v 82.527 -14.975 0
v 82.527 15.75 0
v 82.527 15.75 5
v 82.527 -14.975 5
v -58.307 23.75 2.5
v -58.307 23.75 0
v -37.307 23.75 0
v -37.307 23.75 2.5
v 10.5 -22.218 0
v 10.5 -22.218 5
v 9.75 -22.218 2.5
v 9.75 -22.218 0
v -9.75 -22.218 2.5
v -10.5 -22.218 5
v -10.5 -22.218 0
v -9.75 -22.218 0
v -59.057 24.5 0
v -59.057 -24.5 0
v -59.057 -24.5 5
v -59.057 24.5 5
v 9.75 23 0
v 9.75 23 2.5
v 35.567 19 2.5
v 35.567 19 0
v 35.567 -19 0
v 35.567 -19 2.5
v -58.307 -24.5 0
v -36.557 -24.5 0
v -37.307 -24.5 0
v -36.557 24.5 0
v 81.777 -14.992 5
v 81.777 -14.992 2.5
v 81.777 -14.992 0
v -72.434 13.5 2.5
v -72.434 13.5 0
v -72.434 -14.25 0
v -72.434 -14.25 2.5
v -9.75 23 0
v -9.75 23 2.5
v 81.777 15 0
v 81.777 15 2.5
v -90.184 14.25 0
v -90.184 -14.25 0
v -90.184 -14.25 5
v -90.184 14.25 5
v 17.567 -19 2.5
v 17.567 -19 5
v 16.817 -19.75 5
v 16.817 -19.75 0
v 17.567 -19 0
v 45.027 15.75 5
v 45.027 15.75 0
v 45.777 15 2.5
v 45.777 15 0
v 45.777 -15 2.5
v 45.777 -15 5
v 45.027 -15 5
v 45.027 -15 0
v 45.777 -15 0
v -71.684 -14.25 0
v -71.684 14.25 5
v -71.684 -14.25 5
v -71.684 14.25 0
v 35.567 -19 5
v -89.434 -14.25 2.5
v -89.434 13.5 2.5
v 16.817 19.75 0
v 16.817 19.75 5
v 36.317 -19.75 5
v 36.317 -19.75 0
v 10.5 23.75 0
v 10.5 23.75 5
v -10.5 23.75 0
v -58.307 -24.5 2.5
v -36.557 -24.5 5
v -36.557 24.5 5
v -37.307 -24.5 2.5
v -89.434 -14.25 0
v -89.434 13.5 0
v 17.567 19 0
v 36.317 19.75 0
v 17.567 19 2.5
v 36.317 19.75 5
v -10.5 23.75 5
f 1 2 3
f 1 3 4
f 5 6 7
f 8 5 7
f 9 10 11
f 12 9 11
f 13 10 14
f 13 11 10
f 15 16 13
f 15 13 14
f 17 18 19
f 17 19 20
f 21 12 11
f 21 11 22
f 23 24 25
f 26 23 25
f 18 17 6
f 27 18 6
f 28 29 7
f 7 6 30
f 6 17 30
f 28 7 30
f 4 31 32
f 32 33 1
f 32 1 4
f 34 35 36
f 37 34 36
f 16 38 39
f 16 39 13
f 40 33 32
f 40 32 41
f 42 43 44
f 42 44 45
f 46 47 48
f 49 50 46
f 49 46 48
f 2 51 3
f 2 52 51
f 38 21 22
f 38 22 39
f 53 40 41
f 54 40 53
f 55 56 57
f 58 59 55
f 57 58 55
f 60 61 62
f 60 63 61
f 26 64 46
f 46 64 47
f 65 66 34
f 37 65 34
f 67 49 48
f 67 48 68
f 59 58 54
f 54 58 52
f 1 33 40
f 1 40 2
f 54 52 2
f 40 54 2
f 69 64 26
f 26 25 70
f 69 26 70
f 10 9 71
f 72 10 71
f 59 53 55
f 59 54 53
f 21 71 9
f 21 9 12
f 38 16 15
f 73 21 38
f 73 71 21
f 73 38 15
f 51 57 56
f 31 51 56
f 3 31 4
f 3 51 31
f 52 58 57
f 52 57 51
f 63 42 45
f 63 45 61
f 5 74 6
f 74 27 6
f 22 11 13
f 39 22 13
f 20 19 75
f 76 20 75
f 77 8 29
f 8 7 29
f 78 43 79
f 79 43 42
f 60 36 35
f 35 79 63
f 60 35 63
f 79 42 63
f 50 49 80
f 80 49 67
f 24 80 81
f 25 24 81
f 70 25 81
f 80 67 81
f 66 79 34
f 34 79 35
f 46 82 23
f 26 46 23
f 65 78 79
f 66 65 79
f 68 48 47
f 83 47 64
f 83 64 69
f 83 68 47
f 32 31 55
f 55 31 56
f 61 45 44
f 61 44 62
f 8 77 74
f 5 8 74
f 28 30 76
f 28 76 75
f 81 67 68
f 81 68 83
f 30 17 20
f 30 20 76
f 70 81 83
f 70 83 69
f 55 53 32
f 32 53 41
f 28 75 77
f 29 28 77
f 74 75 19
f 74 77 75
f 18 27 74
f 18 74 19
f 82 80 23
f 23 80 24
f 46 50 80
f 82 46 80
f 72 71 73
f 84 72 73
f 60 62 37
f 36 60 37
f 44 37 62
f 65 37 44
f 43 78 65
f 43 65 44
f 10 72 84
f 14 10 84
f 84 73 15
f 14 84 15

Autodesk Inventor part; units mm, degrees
ref_plane "YZ Plane" through (0, 0, 0) normal (1, 0, 0) x (0, 1, 0)
ref_plane "XZ Plane" through (0, 0, 0) normal (0, 1, 0) x (-1, 0, 0)
ref_plane "XY Plane" through (0, 0, 0) normal (0, 0, 1) x (1, 0, 0)
sketch "Sketch1" plane through (0, 0, 0) normal (0, 0, 1) x (1, 0, 0)
  point P0 (0, 0)
sketch "Sketch2" plane through (0, 0, 0) normal (0, 0, 1) x (1, 0, 0)
  line L0 (-9.25, -22.217934) -> (-9.25, 23)
  line L1 (-9.25, 23) -> (9.25, 23)
  line L2 (9.25, -23) -> (-9.25, 23) construction
  line L3 (-9.25, -23) -> (9.25, 23) construction
  line L4 (-10, 23.75) -> (10, 23.75)
  line L5 (10, 23.75) -> (10, -22.217934)
  line L6 (-10, -22.217934) -> (-10, 23.75)
  line L7 (-10, 23.75) -> (10, -23.75) construction
  line L8 (10, 23.75) -> (-10, -23.75) construction
  line L9 (-58.307494, 23.75) -> (-37.307494, 23.75)
  line L10 (-37.307494, 23.75) -> (-37.307494, -23.75)
  line L11 (-37.307494, -23.75) -> (-58.307494, -23.75)
  line L12 (-58.307494, -23.75) -> (-58.307494, 23.75)
  line L13 (-58.307494, 23.75) -> (-37.307494, -23.75) construction
  line L14 (-37.307494, 23.75) -> (-58.307494, -23.75) construction
  line L15 (-59.057494, 24.5) -> (-36.557494, 24.5)
  line L16 (-36.557494, 24.5) -> (-36.557494, -24.5)
  line L17 (-36.557494, -24.5) -> (-59.057494, -24.5)
  line L18 (-59.057494, -24.5) -> (-59.057494, 24.5)
  line L19 (-59.057494, 24.5) -> (-36.557494, -24.5) construction
  line L20 (-36.557494, 24.5) -> (-59.057494, -24.5) construction
  line L21 (-89.43439, 13.5) -> (-72.43439, 13.5)
  line L22 (-72.43439, 13.5) -> (-72.43439, -13.5)
  line L23 (-72.43439, -13.5) -> (-89.43439, -13.5)
  line L24 (-89.43439, -13.5) -> (-89.43439, 13.5)
  line L25 (-89.43439, 13.5) -> (-72.43439, -13.5) construction
  line L26 (-72.43439, 13.5) -> (-89.43439, -13.5) construction
  line L27 (-90.18439, -14.25) -> (-90.18439, 14.25)
  line L28 (-90.18439, 14.25) -> (-71.68439, 14.25)
  line L29 (-71.68439, 14.25) -> (-71.68439, -14.25)
  line L30 (-71.68439, -14.25) -> (-90.18439, 14.25) construction
  line L31 (-90.18439, -14.25) -> (-71.68439, 14.25) construction
  line L32 (17.56678, 19) -> (35.56678, 19)
  line L33 (35.56678, 19) -> (35.56678, -19)
  line L34 (35.56678, -19) -> (17.56678, -19)
  line L35 (17.56678, -19) -> (17.56678, 19)
  line L36 (17.56678, 19) -> (35.56678, -19) construction
  line L37 (35.56678, 19) -> (17.56678, -19) construction
  line L38 (16.81678, -19.75) -> (16.81678, 19.75)
  line L39 (16.81678, 19.75) -> (36.31678, 19.75)
  line L40 (36.31678, 19.75) -> (36.31678, -19.75)
  line L41 (36.31678, -19.75) -> (16.81678, 19.75) construction
  line L42 (16.81678, -19.75) -> (36.31678, 19.75) construction
  line L43 (81.776505, -14.991674) -> (81.776505, 15)
  line L44 (81.776505, 15) -> (45.776505, 15)
  line L45 (45.776505, 15) -> (45.776505, -15)
  line L46 (45.776505, -15) -> (81.776505, 15) construction
  line L47 (81.776505, -14.991674) -> (45.776505, 15) construction
  line L48 (45.026505, 15.75) -> (82.526505, 15.75)
  line L49 (82.526505, 15.75) -> (82.526505, -14.974995)
  line L50 (45.026505, -15) -> (45.026505, 15.75)
  line L51 (45.026505, 15.75) -> (82.09375, -15.378222) construction
  line L52 (82.526505, 15.75) -> (63.776505, 0) construction
  line L53 (46.395553, -15) -> (45.526505, -15.75) construction
  line L54 (81.776505, -14.991674) -> (82.526505, -14.974995)
  line L55 (45.776505, -15) -> (45.026505, -15)
  line L56 (-9.25, -23.75) -> (-9.55163, -23.75)
  line L57 (-10, -22.217934) -> (-9.25, -22.217934)
  line L58 (9.25, -22.217934) -> (10, -22.217934)
  line L59 (9.25, 23) -> (9.25, 21.96875)
  line L60 (9.25, -21.96875) -> (9.25, -22.217934)
  line L61 (9.25, -21.96875) -> (9.25, 23)
  line L62 (-89.43439, -13.5) -> (-89.43439, -14.25)
  line L63 (-72.43439, -13.5) -> (-72.43439, -14.25)
  line L64 (-71.68439, -14.25) -> (-72.43439, -14.25)
  line L65 (-89.43439, -14.25) -> (-90.18439, -14.25)
  line L66 (0, 0) -> (0, -5.712725)
  line L67 (17.56678, -19) -> (16.81678, -19.75)
  line L68 (35.56678, -19) -> (36.31678, -19.75)
  line L69 (36.31678, -19.75) -> (35.56678, -19.75)
  line L70 (17.56678, -19.75) -> (16.81678, -19.75)
  line L71 (63.776505, 0) -> (63.776505, -4.283489)
  point P0 (-47.807494, 0)
  point P1 (-47.807494, 0)
  point P2 (-80.93439, 0)
  point P3 (-80.93439, 0)
  point P4 (26.56678, 0)
  point P5 (63.779004, 0.002082)
  dimension "d0" = 18.5
  dimension "d3" = 47.5
  dimension "d4" = 21
  dimension "d5" = 47.5
  dimension "d6" = 22.5
  dimension "d7" = 49
  dimension "d8" = 17
  dimension "d9" = 27
  dimension "d10" = 18.5
  dimension "d11" = 28.5
  dimension "d12" = 18
  dimension "d13" = 38
  dimension "d14" = 19.5
  dimension "d15" = 39.5
  dimension "d16" = 36
  dimension "d24" = 20
  dimension "d25" = 37.5
extrude "Extrusion1" add sketch "Sketch2" along normal blind 5 contours L57 L6 L4 L5 L58 L60 L61 L59 L1 L0 | L15 L16 L17 L18 | L24 L62 L65 L27 L28 L29 L64 L63 L22 L21 | L35 L67 L38 L39 L40 L68 L33 L32 | L43 L44 L45 L55 L50 L48 L49 L54
sketch "Sketch3" plane through (0, 0, 5) normal (0, 0, 1) x (1, 0, 0)
  line L0 (-9.25, -22.217934) -> (-9.25, 23)
  line L1 (-9.25, 23) -> (9.25, 23)
  line L2 (9.25, 23) -> (9.25, -22.217934)
  line L3 (17.56678, -19) -> (17.56678, 19)
  line L4 (17.56678, 19) -> (35.56678, 19)
  line L5 (35.56678, 19) -> (35.56678, -19)
  line L6 (35.56678, -19) -> (17.56678, -19)
  line L7 (45.776505, -15) -> (45.776505, 15)
  line L8 (45.776505, 15) -> (81.776505, 15)
  line L9 (81.776505, 15) -> (81.776505, -14.991674)
  line L10 (-58.307494, 23.75) -> (-37.307494, 23.75)
  line L11 (-58.307494, -23.75) -> (-58.307494, 23.75)
  line L12 (-37.307494, 23.75) -> (-37.307494, -23.75)
  line L13 (-37.307494, -23.75) -> (-58.307494, -23.75)
  line L14 (-72.43439, 13.5) -> (-72.43439, -14.25)
  line L15 (-89.43439, 13.5) -> (-72.43439, 13.5)
  line L16 (-89.43439, -14.25) -> (-89.43439, 13.5)
  line L17 (9.25, -22.217934) -> (-9.25, -22.217934)
  line L18 (81.776505, -15) -> (45.776505, -15)
  line L19 (-71.68439, -14.25) -> (-71.68439, 14.25)
  line L20 (-89.43439, -14.25) -> (-71.68439, -14.25)
  line L21 (-71.68439, -14.25) -> (-71.68439, 14.25)
  line L22 (-71.68439, 14.25) -> (-90.18439, 14.25)
  line L23 (-90.18439, 14.25) -> (-90.18439, -14.25)
  line L24 (-90.18439, 14.25) -> (-90.18439, -14.25)
  line L25 (-89.43439, -14.25) -> (-89.43439, 13.5)
  line L26 (-90.18439, -14.25) -> (-89.43439, -14.25)
  line L27 (-89.43439, -14.25) -> (-72.43439, -14.25)
  point P0 (0, 0)
  point P1 (-72.43439, -12.5)
  point P2 (-89.43439, -12.5)
sketch "Sketch3 outline for Extrusion2" plane through (0, 0, 5) normal (0, 0, 1) x (1, 0, 0)
  line L0 (-72.43439, 13.5) -> (-89.43439, 13.5)
  line L1 (-89.43439, 13.5) -> (-89.43439, -14.25)
  line L2 (-89.43439, -14.25) -> (-72.43439, -14.25)
  line L3 (-72.43439, -14.25) -> (-72.43439, 13.5)
  line L4 (17.56678, -19) -> (17.56678, 19)
  line L5 (17.56678, 19) -> (35.56678, 19)
  line L6 (35.56678, 19) -> (35.56678, -19)
  line L7 (35.56678, -19) -> (17.56678, -19)
  line L8 (-58.307494, 23.75) -> (-37.307494, 23.75)
  line L9 (-37.307494, 23.75) -> (-37.307494, -23.75)
  line L10 (-37.307494, -23.75) -> (-58.307494, -23.75)
  line L11 (-58.307494, -23.75) -> (-58.307494, 23.75)
  line L12 (-9.25, -22.217934) -> (-9.25, 23)
  line L13 (-9.25, 23) -> (9.25, 23)
  line L14 (9.25, 23) -> (9.25, -22.217934)
  line L15 (9.25, -22.217934) -> (-9.25, -22.217934)
  line L16 (45.776505, -15) -> (45.776505, 15)
  line L17 (45.776505, 15) -> (81.776505, 15)
  line L18 (81.776505, 15) -> (81.776505, -14.991674)
  line L19 (81.776505, -14.991674) -> (45.776505, -15)
extrude "Extrusion2" add sketch "Sketch3 outline for Extrusion2" against normal blind 2.5
sketch "Sketch4" plane through (0, 0, 0) normal (0, 0, -1) x (-1, 0, 0)
  line L0 (-9.25, -22.217934) -> (9.25, -22.217934)
  line L1 (-9.25, 23) -> (9.25, 23)
  line L2 (9.75, -23) -> (-9.75, -23)
  line L3 (-9.75, -23) -> (-9.75, 23)
  line L4 (-9.75, 23) -> (9.75, 23)
  line L5 (9.75, 23) -> (9.75, -23)
  line L6 (9.75, -23) -> (-9.75, 23) construction
  line L7 (-9.75, -23) -> (9.75, 23) construction
  point P0 (0, 0)
  dimension "d26" = 19.5
extrude "Extrusion3" cut sketch "Sketch4" against normal up to surface (2.5 mm away)
sketch "Sketch5" plane through (0, 0, 0) normal (0, 0, -1) x (-1, 0, 0)
  line L0 (10, 23.75) -> (-10, 23.75)
  line L1 (-10.5, -22.217934) -> (-10.5, 23.75)
  line L2 (-10.5, 23.75) -> (10.5, 23.75)
  line L3 (10.5, 23.75) -> (10.5, -22.217934)
  line L4 (10.5, -23.75) -> (-10.5, 23.75) construction
  line L5 (-10.5, -23.75) -> (10.5, 23.75) construction
  line L6 (-9.75, -22.217934) -> (-9.75, 23)
  line L7 (9.75, 23) -> (9.75, -22.217934)
  line L8 (-9.75, 23) -> (9.75, 23)
  line L9 (9.75, -22.217934) -> (-9.75, -22.217934)
  line L10 (9.75, -22.217934) -> (10.5, -22.217934)
  line L11 (-9.75, -22.217934) -> (-10.5, -22.217934)
  line L12 (10.5, -23.75) -> (9.75, -23.75)
  line L13 (-9.75, -23.75) -> (-10.5, -23.75)
  point P0 (0, 0)
  dimension "d29" = 21
extrude "Extrusion4" add sketch "Sketch5" against normal up to surface (5 mm away) contours L2 L3 L10 L7 L8 L6 L11 L1 L0
sketch "Sketch6" plane through (0, 0, 0) normal (0, 0, -1) x (-1, 0, 0)
  line L0 (58.307494, 23.75) -> (58.307494, -23.75)
  line L1 (58.307494, -22.276606) -> (37.307494, -22.276606)
  line L2 (37.307494, -22.276606) -> (37.307494, -28.128935)
  line L3 (37.307494, -28.128935) -> (58.307494, -28.128935)
  line L4 (58.307494, -28.128935) -> (58.307494, -22.276606)
  point P0 (0, 0)
extrude "Extrusion5" cut sketch "Sketch6" against normal up to surface (2.5 mm away)
properties part number "CIRCUIT MOUNT"
